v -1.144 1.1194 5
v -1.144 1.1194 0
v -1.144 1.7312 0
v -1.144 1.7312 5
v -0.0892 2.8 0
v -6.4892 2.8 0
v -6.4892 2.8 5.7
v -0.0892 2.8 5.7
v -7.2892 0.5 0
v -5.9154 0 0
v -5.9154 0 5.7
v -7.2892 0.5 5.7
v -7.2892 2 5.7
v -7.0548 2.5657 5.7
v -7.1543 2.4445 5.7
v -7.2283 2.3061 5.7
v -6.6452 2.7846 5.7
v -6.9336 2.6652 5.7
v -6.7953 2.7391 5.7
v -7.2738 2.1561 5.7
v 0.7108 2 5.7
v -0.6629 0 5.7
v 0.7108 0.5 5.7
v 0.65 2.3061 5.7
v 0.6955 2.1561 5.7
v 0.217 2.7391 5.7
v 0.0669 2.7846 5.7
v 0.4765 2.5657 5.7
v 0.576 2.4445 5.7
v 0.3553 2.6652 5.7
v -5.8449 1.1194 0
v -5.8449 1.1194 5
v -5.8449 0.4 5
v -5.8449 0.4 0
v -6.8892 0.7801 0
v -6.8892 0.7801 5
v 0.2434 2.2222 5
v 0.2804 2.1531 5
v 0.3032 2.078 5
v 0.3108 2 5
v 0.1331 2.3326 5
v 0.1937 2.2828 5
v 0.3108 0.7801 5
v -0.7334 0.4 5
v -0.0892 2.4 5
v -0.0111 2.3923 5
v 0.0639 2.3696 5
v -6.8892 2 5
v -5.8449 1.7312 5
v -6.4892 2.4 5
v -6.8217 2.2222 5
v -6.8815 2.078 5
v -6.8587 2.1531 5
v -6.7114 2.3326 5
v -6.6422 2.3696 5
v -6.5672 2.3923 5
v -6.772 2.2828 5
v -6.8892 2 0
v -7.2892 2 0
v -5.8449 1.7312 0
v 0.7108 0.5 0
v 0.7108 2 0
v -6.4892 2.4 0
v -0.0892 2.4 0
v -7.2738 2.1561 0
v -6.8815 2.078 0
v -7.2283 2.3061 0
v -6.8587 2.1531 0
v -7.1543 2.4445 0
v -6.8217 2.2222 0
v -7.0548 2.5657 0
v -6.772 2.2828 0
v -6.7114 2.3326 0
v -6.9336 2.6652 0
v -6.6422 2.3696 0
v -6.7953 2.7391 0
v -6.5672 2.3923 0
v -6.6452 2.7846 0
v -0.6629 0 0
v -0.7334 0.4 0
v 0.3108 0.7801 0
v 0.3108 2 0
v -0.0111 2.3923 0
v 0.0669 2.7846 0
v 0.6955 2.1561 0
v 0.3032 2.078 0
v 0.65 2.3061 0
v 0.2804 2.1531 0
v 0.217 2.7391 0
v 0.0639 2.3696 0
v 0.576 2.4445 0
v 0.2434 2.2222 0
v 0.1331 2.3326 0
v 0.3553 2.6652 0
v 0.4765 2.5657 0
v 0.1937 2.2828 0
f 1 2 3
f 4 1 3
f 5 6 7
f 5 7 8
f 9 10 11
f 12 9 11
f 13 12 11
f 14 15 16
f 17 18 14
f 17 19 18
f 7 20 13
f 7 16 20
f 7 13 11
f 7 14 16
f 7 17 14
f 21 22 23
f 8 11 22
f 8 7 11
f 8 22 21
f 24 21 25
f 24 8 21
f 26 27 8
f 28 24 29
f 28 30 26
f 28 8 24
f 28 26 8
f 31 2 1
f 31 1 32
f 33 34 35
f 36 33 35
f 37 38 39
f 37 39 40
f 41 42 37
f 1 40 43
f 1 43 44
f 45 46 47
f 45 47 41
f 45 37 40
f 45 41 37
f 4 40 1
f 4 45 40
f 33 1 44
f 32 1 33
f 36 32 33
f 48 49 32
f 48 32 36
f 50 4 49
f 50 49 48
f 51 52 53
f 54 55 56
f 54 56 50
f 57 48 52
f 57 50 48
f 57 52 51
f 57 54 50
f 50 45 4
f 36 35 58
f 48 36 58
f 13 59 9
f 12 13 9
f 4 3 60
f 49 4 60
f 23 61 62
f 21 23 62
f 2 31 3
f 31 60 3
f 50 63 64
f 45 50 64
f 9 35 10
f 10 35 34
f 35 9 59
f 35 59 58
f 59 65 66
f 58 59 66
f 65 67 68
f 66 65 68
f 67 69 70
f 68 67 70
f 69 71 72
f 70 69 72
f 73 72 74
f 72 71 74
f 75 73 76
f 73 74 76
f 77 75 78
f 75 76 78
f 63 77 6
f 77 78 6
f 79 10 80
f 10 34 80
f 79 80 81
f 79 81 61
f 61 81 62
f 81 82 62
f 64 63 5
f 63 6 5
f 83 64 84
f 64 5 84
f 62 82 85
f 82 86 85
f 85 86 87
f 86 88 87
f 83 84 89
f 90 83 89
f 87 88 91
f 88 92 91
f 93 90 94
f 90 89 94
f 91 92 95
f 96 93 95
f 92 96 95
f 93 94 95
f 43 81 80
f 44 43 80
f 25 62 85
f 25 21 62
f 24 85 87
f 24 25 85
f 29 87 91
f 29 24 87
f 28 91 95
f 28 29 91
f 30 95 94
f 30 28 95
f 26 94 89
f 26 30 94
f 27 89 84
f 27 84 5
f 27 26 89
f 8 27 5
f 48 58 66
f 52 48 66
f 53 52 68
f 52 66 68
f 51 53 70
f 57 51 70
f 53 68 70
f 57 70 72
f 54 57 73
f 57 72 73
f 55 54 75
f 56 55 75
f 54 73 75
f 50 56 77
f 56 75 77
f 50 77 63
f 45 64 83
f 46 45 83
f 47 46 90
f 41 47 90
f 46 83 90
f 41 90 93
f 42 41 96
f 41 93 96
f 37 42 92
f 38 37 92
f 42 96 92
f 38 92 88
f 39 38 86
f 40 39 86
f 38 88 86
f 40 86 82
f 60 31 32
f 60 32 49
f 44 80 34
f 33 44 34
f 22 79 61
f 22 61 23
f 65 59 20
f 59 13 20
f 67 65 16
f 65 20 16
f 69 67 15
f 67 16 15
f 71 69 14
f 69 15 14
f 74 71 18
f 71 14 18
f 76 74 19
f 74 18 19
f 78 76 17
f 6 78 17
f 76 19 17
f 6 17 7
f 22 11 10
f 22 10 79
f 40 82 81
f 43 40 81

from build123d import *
from OCP.BRepFilletAPI import BRepFilletAPI_MakeChamfer

# Parameters (mm, degrees)
SKETCH_1_W          = 8
SKETCH_1_H          = 1
SKETCH_1_H_2        = 1.8
EXTRUDE_1_DEPTH     = 5.7
FILLET_1_R          = 0.8
CHAMFER_1_SIZE      = 0.5
CHAMFER_1_SIZE2     = 1.37373871
SKETCH_2_W          = 4.700894011
SKETCH_2_H          = 0.61177093
CUT_EXTRUDE_1_DEPTH = 5


with BuildPart() as part:
    # Эскиз1 → Бобышка-Вытянуть1 (new body)
    with BuildSketch(Plane.XY):
        with Locations((-3.289153283, 2.3)):
            Rectangle(SKETCH_1_W, SKETCH_1_H)
        with Locations((-3.289153283, 0.9)):
            Rectangle(SKETCH_1_W, SKETCH_1_H_2)
    extrude(amount=EXTRUDE_1_DEPTH)

    # Скругление1
    fillet_1_edges = [part.edges().sort_by_distance(p)[0] for p in [
        (0.710846717, 2.8, 2.85),
        (-7.289153283, 2.8, 2.85),
    ]]
    fillet(fillet_1_edges, radius=FILLET_1_R)

    # Фаска1: one chamfer whose edges measure the first distance from different faces: ONE call of the kernel's chamfer builder (chamfer() names one face for all edges)
    chamfer_1_edges_1 = [part.edges().sort_by_distance(p)[0] for p in [
        (0.710846717, 0, 2.85),
    ]]
    chamfer_1_side_1 = [part.faces().sort_by_distance(p)[0] for p in [
        (0.710846717, 1, 2.85),
    ]]
    chamfer_1_edges_2 = [part.edges().sort_by_distance(p)[0] for p in [
        (-7.289153283, 0, 2.85),
    ]]
    chamfer_1_side_2 = [part.faces().sort_by_distance(p)[0] for p in [
        (-7.289153283, 1, 2.85),
    ]]
    chamfer_1 = BRepFilletAPI_MakeChamfer(part.part.solid().wrapped)
    for e in chamfer_1_edges_1:
        chamfer_1.Add(CHAMFER_1_SIZE, CHAMFER_1_SIZE2, e.wrapped, chamfer_1_side_1[0].wrapped)  # the first distance lies on this face
    for e in chamfer_1_edges_2:
        chamfer_1.Add(CHAMFER_1_SIZE, CHAMFER_1_SIZE2, e.wrapped, chamfer_1_side_2[0].wrapped)  # the first distance lies on this face
    add(Compound.cast(chamfer_1.Shape()), mode=Mode.REPLACE)

    # Эскиз2 → Вырез-Вытянуть1 (cut)
    with BuildSketch(Plane(origin=(0, 0, 0), x_dir=(-1, 0, 0), z_dir=(0, 0, -1))):
        with BuildLine():
            Line((-0.310846717, 2), (-0.310846717, 0.780083015))
            Line((-0.310846717, 0.780083015), (0.733422785, 0.4))
            Line((0.733422785, 0.4), (5.844883781, 0.4))
            Line((5.844883781, 0.4), (6.889153283, 0.780083015))
            Line((6.889153283, 0.780083015), (6.889153283, 2))
            ThreePointArc((6.889153283, 2), (6.771995996, 2.282842712), (6.489153283, 2.4))
            Line((6.489153283, 2.4), (0.089153283, 2.4))
            ThreePointArc((0.089153283, 2.4), (-0.193689429, 2.282842712), (-0.310846717, 2))
        make_face()
        with Locations((3.494436776, 1.42533527)):
            Rectangle(SKETCH_2_W, SKETCH_2_H, mode=Mode.SUBTRACT)
    extrude(amount=-CUT_EXTRUDE_1_DEPTH, mode=Mode.SUBTRACT)


solid = part.part
